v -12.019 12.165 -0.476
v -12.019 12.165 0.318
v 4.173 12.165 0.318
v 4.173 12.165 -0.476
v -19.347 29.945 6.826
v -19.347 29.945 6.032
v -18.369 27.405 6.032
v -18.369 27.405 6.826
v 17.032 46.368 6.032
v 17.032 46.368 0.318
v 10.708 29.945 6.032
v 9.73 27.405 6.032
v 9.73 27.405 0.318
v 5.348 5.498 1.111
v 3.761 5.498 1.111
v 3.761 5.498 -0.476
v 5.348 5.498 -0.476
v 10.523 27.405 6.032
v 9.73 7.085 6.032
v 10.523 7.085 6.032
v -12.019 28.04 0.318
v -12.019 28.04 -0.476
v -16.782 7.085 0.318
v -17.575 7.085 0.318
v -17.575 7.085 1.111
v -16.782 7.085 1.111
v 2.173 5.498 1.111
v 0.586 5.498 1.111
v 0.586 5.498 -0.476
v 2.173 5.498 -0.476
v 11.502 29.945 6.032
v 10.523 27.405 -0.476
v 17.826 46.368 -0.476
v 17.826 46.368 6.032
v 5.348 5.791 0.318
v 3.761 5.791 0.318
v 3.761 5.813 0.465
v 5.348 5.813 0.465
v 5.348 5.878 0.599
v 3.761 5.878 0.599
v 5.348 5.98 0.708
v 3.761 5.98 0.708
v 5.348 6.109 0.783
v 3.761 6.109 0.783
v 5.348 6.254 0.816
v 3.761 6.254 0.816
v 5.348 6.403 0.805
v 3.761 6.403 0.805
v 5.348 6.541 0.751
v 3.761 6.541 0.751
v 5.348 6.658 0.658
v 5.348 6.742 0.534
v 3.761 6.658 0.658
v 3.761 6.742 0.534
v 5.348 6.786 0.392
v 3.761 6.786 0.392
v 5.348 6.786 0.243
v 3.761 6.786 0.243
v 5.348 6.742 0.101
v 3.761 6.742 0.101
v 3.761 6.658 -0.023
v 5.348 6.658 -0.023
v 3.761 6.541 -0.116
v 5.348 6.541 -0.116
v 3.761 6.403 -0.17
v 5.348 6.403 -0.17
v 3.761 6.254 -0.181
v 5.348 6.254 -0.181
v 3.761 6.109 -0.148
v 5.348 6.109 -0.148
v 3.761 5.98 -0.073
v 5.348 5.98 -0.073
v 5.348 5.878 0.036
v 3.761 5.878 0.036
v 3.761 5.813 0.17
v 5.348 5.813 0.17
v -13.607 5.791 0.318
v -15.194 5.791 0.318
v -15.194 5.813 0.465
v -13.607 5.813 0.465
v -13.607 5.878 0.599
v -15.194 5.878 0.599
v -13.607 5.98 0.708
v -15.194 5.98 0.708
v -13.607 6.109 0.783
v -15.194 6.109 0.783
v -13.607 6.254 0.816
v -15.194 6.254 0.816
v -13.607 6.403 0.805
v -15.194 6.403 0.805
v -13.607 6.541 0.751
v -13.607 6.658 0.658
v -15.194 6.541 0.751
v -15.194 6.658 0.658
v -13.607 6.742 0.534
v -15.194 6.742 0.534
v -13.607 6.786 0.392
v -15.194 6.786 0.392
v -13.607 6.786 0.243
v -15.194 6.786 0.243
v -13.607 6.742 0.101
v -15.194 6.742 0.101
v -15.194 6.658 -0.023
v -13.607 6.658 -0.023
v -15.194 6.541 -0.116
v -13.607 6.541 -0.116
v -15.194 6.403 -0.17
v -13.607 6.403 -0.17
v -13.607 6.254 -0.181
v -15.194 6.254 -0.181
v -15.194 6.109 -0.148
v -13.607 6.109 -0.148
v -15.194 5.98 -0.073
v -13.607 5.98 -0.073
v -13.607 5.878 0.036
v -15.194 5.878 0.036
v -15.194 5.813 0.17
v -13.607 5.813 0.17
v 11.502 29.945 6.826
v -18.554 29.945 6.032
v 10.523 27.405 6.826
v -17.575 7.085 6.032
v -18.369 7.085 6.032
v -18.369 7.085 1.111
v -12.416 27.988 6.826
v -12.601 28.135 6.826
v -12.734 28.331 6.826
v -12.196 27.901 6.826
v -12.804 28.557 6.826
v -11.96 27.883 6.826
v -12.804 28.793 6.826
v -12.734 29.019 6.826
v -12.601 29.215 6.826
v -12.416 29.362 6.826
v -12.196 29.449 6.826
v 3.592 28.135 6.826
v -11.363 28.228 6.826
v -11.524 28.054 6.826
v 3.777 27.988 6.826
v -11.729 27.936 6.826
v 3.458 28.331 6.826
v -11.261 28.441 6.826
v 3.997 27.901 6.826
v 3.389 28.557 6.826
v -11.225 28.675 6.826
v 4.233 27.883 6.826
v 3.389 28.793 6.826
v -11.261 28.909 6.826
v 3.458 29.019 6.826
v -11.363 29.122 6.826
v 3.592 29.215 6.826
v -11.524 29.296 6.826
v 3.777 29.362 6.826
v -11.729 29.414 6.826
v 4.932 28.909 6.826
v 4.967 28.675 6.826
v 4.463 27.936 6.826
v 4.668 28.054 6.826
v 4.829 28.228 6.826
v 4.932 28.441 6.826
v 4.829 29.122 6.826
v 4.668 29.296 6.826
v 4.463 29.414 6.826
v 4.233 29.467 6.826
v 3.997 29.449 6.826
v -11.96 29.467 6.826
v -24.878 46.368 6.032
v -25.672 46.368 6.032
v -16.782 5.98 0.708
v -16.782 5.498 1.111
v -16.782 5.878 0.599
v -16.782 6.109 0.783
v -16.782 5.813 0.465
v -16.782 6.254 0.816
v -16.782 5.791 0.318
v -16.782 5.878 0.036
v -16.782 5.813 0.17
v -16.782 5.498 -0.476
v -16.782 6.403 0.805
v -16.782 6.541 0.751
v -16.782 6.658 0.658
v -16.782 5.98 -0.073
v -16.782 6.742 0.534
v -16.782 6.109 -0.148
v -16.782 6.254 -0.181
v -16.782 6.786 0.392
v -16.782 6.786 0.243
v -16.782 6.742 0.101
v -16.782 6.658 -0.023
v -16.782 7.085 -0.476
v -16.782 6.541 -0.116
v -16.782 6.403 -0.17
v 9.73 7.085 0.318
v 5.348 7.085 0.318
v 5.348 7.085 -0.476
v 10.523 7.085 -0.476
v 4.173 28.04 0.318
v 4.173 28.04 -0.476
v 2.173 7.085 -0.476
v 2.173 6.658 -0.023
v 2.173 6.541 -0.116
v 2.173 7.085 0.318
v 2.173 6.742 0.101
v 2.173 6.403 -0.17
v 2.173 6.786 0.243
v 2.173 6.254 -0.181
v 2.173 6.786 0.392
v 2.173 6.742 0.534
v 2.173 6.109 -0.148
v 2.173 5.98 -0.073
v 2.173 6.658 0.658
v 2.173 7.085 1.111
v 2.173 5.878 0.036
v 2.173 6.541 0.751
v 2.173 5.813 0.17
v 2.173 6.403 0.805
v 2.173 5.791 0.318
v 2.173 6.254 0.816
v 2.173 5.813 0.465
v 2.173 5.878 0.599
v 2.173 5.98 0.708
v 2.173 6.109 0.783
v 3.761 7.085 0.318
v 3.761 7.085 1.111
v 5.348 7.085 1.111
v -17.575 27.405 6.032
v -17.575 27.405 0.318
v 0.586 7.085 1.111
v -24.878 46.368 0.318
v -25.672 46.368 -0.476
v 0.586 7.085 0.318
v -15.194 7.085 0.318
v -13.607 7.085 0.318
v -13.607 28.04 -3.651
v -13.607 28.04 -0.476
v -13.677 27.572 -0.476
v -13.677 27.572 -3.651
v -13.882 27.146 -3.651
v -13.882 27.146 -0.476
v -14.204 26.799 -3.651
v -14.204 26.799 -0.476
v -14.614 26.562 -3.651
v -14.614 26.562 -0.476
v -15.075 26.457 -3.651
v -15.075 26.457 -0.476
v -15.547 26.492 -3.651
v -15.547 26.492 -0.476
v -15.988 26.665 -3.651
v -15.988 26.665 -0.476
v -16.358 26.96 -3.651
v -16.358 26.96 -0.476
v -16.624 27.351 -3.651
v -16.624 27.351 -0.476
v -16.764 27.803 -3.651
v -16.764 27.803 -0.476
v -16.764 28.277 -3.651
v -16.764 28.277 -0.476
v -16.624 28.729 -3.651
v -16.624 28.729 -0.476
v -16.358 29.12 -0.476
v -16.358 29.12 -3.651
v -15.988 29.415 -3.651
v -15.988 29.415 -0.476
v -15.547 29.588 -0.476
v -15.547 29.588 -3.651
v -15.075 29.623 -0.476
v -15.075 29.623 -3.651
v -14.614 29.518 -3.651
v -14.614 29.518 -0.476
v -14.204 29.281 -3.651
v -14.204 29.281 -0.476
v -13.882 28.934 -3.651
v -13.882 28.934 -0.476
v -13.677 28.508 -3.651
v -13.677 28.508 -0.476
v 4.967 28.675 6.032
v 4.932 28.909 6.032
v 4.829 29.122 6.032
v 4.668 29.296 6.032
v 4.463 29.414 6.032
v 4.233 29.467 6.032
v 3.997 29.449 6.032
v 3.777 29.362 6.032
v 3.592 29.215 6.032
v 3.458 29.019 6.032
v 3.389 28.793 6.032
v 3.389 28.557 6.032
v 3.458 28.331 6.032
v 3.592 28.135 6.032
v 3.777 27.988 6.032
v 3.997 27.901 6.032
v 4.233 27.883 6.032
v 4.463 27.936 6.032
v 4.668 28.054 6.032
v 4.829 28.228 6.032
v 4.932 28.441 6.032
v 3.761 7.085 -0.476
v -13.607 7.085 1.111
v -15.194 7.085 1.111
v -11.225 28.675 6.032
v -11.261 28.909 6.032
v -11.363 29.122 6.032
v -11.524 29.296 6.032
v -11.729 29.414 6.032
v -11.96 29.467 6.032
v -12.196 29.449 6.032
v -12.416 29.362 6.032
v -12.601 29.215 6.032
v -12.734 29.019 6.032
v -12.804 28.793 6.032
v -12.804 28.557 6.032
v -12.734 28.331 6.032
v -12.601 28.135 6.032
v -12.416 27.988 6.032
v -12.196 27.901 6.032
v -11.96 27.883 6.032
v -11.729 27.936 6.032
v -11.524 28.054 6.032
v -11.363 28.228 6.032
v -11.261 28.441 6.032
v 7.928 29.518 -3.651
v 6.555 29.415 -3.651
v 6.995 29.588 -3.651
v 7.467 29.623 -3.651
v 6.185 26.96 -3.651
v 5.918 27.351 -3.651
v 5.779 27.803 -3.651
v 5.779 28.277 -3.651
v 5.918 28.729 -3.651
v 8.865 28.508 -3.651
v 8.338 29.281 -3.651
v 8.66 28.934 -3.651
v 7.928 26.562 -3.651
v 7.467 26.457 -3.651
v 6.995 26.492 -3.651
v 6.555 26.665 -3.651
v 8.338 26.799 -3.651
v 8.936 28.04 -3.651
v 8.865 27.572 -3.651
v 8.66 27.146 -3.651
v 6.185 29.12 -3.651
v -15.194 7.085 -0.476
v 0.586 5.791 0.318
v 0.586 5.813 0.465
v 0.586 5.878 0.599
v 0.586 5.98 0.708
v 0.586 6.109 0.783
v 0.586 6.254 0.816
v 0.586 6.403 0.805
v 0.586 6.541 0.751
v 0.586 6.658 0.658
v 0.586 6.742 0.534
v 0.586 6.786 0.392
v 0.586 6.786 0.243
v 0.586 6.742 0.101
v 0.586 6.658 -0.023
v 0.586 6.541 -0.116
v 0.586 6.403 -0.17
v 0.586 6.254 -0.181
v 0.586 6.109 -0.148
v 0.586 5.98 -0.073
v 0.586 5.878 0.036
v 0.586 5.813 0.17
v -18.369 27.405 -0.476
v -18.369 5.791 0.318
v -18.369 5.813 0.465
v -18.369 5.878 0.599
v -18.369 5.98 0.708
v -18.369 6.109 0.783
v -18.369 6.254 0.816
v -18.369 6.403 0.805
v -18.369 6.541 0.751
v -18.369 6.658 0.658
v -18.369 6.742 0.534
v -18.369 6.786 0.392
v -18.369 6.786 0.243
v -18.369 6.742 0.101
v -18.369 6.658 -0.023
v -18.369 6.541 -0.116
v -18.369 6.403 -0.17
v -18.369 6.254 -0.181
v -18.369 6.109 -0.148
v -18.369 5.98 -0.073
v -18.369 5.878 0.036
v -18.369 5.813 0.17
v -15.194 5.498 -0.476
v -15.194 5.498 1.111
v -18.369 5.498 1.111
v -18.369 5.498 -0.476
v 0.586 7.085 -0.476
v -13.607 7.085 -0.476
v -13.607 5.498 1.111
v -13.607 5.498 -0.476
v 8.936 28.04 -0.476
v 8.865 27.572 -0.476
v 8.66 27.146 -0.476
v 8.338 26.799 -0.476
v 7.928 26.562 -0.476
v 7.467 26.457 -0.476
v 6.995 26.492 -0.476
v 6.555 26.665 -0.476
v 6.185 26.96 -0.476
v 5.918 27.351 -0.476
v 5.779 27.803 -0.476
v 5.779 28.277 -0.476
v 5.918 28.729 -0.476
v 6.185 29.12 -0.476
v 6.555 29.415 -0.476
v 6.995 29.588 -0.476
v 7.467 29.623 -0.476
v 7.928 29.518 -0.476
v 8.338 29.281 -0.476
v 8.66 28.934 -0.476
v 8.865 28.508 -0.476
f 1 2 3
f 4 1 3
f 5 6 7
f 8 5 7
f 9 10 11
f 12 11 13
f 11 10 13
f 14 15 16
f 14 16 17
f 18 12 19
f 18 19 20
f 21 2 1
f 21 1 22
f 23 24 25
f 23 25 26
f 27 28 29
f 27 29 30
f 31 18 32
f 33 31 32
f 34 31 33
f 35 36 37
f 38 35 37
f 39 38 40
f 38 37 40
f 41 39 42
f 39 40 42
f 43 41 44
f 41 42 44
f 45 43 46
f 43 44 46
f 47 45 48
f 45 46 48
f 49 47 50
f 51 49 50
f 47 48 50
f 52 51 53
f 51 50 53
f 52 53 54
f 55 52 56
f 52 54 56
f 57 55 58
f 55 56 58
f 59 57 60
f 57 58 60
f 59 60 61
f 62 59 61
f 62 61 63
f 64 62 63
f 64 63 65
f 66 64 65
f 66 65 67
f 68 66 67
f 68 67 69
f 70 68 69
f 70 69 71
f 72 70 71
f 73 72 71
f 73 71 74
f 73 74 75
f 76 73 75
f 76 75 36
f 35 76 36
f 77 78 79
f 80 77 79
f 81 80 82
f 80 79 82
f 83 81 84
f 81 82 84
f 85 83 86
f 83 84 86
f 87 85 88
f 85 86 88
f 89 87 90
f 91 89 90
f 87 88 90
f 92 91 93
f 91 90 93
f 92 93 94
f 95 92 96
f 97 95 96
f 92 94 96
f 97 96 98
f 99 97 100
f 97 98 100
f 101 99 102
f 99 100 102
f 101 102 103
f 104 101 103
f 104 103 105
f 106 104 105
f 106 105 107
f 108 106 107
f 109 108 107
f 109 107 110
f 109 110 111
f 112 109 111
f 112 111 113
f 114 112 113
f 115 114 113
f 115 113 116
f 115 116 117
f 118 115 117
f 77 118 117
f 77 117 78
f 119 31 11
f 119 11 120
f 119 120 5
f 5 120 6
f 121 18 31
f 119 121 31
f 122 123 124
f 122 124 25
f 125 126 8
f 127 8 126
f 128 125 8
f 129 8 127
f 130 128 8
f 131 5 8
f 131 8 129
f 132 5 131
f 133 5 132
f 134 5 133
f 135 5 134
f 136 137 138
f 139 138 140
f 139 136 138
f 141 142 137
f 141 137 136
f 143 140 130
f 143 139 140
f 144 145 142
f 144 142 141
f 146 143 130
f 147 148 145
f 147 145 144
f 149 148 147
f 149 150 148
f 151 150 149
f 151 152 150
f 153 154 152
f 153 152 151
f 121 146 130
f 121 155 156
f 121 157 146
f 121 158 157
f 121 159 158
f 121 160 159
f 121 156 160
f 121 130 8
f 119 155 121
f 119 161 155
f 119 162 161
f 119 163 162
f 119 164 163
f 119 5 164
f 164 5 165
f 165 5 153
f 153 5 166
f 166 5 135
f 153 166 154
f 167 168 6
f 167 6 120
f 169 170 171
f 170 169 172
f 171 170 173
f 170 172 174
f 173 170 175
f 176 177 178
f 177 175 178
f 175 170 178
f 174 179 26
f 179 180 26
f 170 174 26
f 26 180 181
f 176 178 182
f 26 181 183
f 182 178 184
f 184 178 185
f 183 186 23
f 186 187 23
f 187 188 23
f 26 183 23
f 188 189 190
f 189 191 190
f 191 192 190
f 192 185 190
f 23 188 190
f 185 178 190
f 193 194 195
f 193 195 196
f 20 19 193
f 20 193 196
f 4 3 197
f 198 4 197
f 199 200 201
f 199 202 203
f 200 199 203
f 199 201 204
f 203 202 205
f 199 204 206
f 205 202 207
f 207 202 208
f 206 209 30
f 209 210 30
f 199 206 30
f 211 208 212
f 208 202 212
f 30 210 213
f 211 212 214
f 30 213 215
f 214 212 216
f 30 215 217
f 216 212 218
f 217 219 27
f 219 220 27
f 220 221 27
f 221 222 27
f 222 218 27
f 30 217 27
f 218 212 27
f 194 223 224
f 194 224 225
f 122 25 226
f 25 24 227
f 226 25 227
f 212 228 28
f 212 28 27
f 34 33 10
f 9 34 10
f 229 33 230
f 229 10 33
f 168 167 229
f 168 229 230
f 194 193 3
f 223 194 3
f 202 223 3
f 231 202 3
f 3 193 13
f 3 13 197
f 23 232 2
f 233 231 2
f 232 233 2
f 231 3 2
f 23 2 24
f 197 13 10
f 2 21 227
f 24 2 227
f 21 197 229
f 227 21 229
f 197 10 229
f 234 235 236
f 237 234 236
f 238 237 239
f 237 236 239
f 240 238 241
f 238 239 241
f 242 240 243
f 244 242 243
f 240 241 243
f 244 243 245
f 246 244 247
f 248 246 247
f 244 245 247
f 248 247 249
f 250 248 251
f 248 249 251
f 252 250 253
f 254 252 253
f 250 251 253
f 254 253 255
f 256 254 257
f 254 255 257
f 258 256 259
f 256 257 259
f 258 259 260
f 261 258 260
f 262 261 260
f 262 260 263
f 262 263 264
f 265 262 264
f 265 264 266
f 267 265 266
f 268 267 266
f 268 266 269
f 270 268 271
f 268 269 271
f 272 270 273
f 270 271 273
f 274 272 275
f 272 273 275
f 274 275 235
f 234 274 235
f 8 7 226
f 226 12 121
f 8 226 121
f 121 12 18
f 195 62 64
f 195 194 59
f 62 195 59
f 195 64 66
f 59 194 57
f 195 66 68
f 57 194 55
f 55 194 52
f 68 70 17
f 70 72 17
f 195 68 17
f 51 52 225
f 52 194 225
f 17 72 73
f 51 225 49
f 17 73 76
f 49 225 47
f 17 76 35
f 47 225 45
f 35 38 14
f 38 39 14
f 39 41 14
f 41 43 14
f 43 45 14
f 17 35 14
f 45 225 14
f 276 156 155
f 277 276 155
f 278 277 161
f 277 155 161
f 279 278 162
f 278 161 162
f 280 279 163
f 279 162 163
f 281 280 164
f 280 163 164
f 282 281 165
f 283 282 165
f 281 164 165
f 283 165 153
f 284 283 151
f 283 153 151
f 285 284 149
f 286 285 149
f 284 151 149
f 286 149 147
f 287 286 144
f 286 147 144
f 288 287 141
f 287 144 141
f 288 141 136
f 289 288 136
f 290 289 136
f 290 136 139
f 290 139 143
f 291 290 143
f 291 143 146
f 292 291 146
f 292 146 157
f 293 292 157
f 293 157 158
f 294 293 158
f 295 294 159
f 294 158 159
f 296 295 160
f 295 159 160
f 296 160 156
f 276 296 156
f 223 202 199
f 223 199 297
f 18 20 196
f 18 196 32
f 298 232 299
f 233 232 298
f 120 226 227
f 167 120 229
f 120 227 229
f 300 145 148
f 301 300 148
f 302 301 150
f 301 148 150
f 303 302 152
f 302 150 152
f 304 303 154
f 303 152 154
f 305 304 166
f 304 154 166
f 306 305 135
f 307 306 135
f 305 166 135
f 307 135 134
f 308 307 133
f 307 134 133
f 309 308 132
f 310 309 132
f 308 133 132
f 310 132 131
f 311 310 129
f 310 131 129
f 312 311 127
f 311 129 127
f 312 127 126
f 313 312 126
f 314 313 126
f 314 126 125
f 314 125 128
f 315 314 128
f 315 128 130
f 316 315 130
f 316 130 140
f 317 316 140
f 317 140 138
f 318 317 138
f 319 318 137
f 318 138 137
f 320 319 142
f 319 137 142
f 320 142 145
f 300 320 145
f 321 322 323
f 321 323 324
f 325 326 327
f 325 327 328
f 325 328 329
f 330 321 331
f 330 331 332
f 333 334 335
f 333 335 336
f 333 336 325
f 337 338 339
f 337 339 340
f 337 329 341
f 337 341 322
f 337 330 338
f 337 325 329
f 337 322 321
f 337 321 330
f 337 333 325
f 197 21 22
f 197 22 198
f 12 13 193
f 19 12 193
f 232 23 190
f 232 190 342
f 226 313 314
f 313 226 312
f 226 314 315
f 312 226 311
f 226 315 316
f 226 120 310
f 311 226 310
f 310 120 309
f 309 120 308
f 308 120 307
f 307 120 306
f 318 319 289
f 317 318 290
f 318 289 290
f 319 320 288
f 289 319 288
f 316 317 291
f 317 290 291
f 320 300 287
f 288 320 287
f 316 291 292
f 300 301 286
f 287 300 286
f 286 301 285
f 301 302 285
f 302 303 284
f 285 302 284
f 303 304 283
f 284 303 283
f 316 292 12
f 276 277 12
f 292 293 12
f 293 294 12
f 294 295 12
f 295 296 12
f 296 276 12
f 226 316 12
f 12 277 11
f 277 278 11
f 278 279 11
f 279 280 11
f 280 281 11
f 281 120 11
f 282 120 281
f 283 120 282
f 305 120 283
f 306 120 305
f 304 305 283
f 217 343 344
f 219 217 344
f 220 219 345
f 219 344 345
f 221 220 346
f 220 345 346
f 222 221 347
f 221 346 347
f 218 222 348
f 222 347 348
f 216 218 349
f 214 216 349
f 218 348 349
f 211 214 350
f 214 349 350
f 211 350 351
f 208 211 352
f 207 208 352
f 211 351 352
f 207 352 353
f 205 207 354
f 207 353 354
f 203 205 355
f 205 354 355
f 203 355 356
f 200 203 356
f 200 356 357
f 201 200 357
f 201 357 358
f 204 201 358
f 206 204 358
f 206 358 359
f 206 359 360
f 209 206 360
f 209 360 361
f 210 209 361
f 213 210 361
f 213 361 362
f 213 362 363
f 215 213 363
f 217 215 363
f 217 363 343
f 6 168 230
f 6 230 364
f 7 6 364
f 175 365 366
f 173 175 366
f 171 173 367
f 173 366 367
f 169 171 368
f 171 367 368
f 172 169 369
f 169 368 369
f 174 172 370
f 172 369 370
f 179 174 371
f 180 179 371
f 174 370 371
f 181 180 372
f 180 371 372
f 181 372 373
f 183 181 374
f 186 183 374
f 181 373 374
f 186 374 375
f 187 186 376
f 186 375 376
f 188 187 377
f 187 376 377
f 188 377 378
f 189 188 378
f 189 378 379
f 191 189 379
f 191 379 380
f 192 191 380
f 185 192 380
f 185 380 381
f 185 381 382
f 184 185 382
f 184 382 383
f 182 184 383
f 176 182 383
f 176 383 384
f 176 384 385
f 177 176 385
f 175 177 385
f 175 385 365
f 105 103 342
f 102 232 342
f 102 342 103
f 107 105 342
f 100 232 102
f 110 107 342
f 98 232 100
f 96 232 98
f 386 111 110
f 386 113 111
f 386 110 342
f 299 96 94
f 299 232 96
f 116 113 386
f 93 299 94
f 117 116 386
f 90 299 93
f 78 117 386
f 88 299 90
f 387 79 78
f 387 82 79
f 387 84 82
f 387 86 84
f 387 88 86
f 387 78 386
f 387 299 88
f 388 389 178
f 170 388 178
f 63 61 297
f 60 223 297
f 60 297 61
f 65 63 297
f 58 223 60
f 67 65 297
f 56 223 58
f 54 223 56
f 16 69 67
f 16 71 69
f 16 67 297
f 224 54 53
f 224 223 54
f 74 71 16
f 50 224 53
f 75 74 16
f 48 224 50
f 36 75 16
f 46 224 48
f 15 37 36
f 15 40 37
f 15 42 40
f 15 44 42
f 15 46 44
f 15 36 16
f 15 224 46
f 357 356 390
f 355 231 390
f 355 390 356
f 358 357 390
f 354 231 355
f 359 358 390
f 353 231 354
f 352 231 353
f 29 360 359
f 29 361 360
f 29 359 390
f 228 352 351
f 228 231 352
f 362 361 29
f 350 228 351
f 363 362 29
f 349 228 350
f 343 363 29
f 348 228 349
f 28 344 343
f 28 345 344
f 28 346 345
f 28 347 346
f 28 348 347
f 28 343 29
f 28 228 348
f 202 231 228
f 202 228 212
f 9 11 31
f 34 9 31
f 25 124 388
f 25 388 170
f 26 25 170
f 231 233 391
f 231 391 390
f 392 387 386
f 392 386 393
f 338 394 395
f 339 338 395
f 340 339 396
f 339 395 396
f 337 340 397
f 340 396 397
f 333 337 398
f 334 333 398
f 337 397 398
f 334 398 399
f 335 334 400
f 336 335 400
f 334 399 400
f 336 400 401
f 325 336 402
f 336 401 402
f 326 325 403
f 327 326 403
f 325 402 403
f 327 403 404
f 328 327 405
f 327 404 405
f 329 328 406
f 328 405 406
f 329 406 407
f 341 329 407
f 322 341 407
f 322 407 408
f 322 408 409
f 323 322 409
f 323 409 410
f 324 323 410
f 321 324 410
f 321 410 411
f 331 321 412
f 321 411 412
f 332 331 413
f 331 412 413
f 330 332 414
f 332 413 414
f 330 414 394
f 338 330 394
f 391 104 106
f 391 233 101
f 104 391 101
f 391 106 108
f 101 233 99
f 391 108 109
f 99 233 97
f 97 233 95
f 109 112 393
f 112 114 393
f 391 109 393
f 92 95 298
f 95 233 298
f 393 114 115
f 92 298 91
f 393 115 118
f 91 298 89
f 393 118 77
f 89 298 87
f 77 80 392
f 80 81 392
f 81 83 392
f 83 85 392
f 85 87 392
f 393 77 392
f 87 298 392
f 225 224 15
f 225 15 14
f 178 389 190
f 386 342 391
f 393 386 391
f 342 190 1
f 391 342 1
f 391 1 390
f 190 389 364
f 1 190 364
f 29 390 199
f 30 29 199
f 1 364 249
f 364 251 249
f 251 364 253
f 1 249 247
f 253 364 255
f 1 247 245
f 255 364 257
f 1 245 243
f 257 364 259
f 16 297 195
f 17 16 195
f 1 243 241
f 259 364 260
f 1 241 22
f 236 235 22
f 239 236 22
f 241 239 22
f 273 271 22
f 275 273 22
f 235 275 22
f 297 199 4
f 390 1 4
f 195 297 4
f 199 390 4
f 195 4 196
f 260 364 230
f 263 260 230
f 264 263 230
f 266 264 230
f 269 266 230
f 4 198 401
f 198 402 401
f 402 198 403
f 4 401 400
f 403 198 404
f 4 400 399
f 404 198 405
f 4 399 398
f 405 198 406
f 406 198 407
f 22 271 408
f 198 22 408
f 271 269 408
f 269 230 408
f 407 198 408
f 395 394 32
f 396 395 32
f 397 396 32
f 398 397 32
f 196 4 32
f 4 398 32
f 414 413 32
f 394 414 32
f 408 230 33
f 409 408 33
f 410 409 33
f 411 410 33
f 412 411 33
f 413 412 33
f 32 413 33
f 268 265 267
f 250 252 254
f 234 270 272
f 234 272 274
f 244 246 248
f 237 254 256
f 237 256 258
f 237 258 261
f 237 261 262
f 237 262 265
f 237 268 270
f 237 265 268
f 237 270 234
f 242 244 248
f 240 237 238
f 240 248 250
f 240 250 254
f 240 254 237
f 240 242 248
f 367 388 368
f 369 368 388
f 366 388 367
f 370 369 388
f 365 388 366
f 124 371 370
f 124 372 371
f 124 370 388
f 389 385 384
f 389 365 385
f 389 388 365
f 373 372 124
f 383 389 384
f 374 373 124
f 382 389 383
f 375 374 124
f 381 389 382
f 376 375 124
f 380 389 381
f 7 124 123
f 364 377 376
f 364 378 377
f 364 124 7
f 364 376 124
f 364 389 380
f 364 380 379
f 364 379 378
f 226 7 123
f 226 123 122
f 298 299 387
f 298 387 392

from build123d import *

# Parameters (mm, degrees)
F0_W      = 16.1925
F0_H      = 15.875
F1_DEPTH  = 0.3175
F3_DEPTH  = 5.715
F5_DEPTH  = 0.79375
F6_R      = 0.79375
F7_DEPTH  = 0.79375
F8_DEPTH  = 0.3175
F9_W      = 1.5875
F9_H      = 0.635
F10_DEPTH = 1.5875
F11_DEPTH = 0.3175
F12_W     = 1.5875
F12_H     = 1.5875
F13_DEPTH = 0.79375
F14_DEPTH = 0.15875
F15_R     = 0.5
F16_DEPTH = 25.4
F17_R     = 1.5875
F18_DEPTH = 3.175


with BuildPart() as f1:
    # F0 (on Top) → F1 (new body)
    with BuildSketch(Plane.XY):
        Polygon((-25.671613648, 46.3675076752), (-18.369113648, 27.4050211887), (-18.369113648, 7.0850211887), (10.523386352, 7.0850211887), (10.523386352, 27.4050211887), (17.825886352, 46.3675076752), align=None)
        with Locations((-3.922863648, 20.1025211887)):
            Rectangle(F0_W, F0_H, mode=Mode.SUBTRACT)
    extrude(amount=F1_DEPTH)

    # F2 (on face) → F3 (join)
    with BuildSketch(Plane.XY.offset(0.3175)):
        Polygon((17.825886352, 46.3675076752), (17.032136352, 46.3675076752), (9.729636352, 27.4050211887), (9.729636352, 7.0850211887), (10.523386352, 7.0850211887), (10.523386352, 27.4050211887), align=None)
        Polygon((-24.877863648, 46.3675076752), (-25.671613648, 46.3675076752), (-18.369113648, 27.4050211887), (-18.369113648, 7.0850211887), (-17.575363648, 7.0850211887), (-17.575363648, 27.4050211887), align=None)
    extrude(amount=F3_DEPTH)

    # F4 (on face) → F5 (join)
    with BuildSketch(Plane.XY.offset(6.0325)):
        Polygon((-19.3472738705, 29.9450211887), (-18.369113648, 27.4050211887), (10.523386352, 27.4050211887), (11.5015465745, 29.9450211887), align=None)
    extrude(amount=F5_DEPTH)

    # F6 (on face) → F7 (cut)
    with BuildSketch(Plane.XY.offset(6.82625)):
        with Locations((-12.019113648, 28.6750211887)):
            Circle(F6_R)
        with Locations((4.173386352, 28.6750211887)):
            Circle(F6_R)
    extrude(amount=-F7_DEPTH, mode=Mode.SUBTRACT)

    # F8 (add): a face of the model
    f8_faces = [f1.faces().sort_by_distance(p)[0] for p in [
        (-3.922863648, 30.216271867, 0),
    ]]
    extrude(f8_faces, amount=F8_DEPTH)

    # F9 (on face) → F10 (join)
    with BuildSketch(Plane.XZ.offset(-7.0850211887)):
        Polygon((-17.575363648, 0.3175), (-18.369113648, 0.3175), (-18.369113648, -0.3175), (-16.781613648, -0.3175), (-16.781613648, 0.3175), align=None)
        with Locations((-14.400363648, 0)):
            Rectangle(F9_W, F9_H)
        with Locations((1.379386352, 0)):
            Rectangle(F9_W, F9_H)
        with Locations((4.554386352, 0)):
            Rectangle(F9_W, F9_H)
    extrude(amount=F10_DEPTH)

    # F11 (add): a face of the model
    f11_faces = [f1.faces().sort_by_distance(p)[0] for p in [
        (-3.9482759262, 29.9813117116, -0.3175),
    ]]
    extrude(f11_faces, amount=F11_DEPTH)

    # F12 (on face) → F13 (join)
    with BuildSketch(Plane.XY.offset(0.3175)):
        with Locations((-17.575363648, 6.2912711887)):
            Rectangle(F12_W, F12_H)
        with Locations((-14.400363648, 6.2912711887)):
            Rectangle(F12_W, F12_H)
        with Locations((1.379386352, 6.2912711887)):
            Rectangle(F12_W, F12_H)
        with Locations((4.554386352, 6.2912711887)):
            Rectangle(F12_W, F12_H)
    extrude(amount=F13_DEPTH)

    # F14 (cut): a face of the model
    f14_faces = [f1.faces().sort_by_distance(p)[0] for p in [
        (-3.9482759262, 29.9813117116, -0.635),
    ]]
    extrude(f14_faces, amount=-F14_DEPTH, mode=Mode.SUBTRACT)

    # F15 (on face) → F16 (cut)
    with BuildSketch(Plane(origin=(-18.369113648, 0, 0), x_dir=(0, -1, 0), z_dir=(-1, 0, 0))):
        with Locations((-6.2912711887, 0.3175)):
            Circle(F15_R)
    extrude(amount=-F16_DEPTH, mode=Mode.SUBTRACT)

    # F17 (on face) → F18 (join)
    with BuildSketch(Plane(origin=(0, 0, -0.47625), x_dir=(1, 0, 0), z_dir=(0, 0, -1))):
        with Locations((-15.194113648, -28.0400211887)):
            Circle(F17_R)
        with Locations((7.348386352, -28.0400211887)):
            Circle(F17_R)
    extrude(amount=F18_DEPTH)


solid = f1.part
